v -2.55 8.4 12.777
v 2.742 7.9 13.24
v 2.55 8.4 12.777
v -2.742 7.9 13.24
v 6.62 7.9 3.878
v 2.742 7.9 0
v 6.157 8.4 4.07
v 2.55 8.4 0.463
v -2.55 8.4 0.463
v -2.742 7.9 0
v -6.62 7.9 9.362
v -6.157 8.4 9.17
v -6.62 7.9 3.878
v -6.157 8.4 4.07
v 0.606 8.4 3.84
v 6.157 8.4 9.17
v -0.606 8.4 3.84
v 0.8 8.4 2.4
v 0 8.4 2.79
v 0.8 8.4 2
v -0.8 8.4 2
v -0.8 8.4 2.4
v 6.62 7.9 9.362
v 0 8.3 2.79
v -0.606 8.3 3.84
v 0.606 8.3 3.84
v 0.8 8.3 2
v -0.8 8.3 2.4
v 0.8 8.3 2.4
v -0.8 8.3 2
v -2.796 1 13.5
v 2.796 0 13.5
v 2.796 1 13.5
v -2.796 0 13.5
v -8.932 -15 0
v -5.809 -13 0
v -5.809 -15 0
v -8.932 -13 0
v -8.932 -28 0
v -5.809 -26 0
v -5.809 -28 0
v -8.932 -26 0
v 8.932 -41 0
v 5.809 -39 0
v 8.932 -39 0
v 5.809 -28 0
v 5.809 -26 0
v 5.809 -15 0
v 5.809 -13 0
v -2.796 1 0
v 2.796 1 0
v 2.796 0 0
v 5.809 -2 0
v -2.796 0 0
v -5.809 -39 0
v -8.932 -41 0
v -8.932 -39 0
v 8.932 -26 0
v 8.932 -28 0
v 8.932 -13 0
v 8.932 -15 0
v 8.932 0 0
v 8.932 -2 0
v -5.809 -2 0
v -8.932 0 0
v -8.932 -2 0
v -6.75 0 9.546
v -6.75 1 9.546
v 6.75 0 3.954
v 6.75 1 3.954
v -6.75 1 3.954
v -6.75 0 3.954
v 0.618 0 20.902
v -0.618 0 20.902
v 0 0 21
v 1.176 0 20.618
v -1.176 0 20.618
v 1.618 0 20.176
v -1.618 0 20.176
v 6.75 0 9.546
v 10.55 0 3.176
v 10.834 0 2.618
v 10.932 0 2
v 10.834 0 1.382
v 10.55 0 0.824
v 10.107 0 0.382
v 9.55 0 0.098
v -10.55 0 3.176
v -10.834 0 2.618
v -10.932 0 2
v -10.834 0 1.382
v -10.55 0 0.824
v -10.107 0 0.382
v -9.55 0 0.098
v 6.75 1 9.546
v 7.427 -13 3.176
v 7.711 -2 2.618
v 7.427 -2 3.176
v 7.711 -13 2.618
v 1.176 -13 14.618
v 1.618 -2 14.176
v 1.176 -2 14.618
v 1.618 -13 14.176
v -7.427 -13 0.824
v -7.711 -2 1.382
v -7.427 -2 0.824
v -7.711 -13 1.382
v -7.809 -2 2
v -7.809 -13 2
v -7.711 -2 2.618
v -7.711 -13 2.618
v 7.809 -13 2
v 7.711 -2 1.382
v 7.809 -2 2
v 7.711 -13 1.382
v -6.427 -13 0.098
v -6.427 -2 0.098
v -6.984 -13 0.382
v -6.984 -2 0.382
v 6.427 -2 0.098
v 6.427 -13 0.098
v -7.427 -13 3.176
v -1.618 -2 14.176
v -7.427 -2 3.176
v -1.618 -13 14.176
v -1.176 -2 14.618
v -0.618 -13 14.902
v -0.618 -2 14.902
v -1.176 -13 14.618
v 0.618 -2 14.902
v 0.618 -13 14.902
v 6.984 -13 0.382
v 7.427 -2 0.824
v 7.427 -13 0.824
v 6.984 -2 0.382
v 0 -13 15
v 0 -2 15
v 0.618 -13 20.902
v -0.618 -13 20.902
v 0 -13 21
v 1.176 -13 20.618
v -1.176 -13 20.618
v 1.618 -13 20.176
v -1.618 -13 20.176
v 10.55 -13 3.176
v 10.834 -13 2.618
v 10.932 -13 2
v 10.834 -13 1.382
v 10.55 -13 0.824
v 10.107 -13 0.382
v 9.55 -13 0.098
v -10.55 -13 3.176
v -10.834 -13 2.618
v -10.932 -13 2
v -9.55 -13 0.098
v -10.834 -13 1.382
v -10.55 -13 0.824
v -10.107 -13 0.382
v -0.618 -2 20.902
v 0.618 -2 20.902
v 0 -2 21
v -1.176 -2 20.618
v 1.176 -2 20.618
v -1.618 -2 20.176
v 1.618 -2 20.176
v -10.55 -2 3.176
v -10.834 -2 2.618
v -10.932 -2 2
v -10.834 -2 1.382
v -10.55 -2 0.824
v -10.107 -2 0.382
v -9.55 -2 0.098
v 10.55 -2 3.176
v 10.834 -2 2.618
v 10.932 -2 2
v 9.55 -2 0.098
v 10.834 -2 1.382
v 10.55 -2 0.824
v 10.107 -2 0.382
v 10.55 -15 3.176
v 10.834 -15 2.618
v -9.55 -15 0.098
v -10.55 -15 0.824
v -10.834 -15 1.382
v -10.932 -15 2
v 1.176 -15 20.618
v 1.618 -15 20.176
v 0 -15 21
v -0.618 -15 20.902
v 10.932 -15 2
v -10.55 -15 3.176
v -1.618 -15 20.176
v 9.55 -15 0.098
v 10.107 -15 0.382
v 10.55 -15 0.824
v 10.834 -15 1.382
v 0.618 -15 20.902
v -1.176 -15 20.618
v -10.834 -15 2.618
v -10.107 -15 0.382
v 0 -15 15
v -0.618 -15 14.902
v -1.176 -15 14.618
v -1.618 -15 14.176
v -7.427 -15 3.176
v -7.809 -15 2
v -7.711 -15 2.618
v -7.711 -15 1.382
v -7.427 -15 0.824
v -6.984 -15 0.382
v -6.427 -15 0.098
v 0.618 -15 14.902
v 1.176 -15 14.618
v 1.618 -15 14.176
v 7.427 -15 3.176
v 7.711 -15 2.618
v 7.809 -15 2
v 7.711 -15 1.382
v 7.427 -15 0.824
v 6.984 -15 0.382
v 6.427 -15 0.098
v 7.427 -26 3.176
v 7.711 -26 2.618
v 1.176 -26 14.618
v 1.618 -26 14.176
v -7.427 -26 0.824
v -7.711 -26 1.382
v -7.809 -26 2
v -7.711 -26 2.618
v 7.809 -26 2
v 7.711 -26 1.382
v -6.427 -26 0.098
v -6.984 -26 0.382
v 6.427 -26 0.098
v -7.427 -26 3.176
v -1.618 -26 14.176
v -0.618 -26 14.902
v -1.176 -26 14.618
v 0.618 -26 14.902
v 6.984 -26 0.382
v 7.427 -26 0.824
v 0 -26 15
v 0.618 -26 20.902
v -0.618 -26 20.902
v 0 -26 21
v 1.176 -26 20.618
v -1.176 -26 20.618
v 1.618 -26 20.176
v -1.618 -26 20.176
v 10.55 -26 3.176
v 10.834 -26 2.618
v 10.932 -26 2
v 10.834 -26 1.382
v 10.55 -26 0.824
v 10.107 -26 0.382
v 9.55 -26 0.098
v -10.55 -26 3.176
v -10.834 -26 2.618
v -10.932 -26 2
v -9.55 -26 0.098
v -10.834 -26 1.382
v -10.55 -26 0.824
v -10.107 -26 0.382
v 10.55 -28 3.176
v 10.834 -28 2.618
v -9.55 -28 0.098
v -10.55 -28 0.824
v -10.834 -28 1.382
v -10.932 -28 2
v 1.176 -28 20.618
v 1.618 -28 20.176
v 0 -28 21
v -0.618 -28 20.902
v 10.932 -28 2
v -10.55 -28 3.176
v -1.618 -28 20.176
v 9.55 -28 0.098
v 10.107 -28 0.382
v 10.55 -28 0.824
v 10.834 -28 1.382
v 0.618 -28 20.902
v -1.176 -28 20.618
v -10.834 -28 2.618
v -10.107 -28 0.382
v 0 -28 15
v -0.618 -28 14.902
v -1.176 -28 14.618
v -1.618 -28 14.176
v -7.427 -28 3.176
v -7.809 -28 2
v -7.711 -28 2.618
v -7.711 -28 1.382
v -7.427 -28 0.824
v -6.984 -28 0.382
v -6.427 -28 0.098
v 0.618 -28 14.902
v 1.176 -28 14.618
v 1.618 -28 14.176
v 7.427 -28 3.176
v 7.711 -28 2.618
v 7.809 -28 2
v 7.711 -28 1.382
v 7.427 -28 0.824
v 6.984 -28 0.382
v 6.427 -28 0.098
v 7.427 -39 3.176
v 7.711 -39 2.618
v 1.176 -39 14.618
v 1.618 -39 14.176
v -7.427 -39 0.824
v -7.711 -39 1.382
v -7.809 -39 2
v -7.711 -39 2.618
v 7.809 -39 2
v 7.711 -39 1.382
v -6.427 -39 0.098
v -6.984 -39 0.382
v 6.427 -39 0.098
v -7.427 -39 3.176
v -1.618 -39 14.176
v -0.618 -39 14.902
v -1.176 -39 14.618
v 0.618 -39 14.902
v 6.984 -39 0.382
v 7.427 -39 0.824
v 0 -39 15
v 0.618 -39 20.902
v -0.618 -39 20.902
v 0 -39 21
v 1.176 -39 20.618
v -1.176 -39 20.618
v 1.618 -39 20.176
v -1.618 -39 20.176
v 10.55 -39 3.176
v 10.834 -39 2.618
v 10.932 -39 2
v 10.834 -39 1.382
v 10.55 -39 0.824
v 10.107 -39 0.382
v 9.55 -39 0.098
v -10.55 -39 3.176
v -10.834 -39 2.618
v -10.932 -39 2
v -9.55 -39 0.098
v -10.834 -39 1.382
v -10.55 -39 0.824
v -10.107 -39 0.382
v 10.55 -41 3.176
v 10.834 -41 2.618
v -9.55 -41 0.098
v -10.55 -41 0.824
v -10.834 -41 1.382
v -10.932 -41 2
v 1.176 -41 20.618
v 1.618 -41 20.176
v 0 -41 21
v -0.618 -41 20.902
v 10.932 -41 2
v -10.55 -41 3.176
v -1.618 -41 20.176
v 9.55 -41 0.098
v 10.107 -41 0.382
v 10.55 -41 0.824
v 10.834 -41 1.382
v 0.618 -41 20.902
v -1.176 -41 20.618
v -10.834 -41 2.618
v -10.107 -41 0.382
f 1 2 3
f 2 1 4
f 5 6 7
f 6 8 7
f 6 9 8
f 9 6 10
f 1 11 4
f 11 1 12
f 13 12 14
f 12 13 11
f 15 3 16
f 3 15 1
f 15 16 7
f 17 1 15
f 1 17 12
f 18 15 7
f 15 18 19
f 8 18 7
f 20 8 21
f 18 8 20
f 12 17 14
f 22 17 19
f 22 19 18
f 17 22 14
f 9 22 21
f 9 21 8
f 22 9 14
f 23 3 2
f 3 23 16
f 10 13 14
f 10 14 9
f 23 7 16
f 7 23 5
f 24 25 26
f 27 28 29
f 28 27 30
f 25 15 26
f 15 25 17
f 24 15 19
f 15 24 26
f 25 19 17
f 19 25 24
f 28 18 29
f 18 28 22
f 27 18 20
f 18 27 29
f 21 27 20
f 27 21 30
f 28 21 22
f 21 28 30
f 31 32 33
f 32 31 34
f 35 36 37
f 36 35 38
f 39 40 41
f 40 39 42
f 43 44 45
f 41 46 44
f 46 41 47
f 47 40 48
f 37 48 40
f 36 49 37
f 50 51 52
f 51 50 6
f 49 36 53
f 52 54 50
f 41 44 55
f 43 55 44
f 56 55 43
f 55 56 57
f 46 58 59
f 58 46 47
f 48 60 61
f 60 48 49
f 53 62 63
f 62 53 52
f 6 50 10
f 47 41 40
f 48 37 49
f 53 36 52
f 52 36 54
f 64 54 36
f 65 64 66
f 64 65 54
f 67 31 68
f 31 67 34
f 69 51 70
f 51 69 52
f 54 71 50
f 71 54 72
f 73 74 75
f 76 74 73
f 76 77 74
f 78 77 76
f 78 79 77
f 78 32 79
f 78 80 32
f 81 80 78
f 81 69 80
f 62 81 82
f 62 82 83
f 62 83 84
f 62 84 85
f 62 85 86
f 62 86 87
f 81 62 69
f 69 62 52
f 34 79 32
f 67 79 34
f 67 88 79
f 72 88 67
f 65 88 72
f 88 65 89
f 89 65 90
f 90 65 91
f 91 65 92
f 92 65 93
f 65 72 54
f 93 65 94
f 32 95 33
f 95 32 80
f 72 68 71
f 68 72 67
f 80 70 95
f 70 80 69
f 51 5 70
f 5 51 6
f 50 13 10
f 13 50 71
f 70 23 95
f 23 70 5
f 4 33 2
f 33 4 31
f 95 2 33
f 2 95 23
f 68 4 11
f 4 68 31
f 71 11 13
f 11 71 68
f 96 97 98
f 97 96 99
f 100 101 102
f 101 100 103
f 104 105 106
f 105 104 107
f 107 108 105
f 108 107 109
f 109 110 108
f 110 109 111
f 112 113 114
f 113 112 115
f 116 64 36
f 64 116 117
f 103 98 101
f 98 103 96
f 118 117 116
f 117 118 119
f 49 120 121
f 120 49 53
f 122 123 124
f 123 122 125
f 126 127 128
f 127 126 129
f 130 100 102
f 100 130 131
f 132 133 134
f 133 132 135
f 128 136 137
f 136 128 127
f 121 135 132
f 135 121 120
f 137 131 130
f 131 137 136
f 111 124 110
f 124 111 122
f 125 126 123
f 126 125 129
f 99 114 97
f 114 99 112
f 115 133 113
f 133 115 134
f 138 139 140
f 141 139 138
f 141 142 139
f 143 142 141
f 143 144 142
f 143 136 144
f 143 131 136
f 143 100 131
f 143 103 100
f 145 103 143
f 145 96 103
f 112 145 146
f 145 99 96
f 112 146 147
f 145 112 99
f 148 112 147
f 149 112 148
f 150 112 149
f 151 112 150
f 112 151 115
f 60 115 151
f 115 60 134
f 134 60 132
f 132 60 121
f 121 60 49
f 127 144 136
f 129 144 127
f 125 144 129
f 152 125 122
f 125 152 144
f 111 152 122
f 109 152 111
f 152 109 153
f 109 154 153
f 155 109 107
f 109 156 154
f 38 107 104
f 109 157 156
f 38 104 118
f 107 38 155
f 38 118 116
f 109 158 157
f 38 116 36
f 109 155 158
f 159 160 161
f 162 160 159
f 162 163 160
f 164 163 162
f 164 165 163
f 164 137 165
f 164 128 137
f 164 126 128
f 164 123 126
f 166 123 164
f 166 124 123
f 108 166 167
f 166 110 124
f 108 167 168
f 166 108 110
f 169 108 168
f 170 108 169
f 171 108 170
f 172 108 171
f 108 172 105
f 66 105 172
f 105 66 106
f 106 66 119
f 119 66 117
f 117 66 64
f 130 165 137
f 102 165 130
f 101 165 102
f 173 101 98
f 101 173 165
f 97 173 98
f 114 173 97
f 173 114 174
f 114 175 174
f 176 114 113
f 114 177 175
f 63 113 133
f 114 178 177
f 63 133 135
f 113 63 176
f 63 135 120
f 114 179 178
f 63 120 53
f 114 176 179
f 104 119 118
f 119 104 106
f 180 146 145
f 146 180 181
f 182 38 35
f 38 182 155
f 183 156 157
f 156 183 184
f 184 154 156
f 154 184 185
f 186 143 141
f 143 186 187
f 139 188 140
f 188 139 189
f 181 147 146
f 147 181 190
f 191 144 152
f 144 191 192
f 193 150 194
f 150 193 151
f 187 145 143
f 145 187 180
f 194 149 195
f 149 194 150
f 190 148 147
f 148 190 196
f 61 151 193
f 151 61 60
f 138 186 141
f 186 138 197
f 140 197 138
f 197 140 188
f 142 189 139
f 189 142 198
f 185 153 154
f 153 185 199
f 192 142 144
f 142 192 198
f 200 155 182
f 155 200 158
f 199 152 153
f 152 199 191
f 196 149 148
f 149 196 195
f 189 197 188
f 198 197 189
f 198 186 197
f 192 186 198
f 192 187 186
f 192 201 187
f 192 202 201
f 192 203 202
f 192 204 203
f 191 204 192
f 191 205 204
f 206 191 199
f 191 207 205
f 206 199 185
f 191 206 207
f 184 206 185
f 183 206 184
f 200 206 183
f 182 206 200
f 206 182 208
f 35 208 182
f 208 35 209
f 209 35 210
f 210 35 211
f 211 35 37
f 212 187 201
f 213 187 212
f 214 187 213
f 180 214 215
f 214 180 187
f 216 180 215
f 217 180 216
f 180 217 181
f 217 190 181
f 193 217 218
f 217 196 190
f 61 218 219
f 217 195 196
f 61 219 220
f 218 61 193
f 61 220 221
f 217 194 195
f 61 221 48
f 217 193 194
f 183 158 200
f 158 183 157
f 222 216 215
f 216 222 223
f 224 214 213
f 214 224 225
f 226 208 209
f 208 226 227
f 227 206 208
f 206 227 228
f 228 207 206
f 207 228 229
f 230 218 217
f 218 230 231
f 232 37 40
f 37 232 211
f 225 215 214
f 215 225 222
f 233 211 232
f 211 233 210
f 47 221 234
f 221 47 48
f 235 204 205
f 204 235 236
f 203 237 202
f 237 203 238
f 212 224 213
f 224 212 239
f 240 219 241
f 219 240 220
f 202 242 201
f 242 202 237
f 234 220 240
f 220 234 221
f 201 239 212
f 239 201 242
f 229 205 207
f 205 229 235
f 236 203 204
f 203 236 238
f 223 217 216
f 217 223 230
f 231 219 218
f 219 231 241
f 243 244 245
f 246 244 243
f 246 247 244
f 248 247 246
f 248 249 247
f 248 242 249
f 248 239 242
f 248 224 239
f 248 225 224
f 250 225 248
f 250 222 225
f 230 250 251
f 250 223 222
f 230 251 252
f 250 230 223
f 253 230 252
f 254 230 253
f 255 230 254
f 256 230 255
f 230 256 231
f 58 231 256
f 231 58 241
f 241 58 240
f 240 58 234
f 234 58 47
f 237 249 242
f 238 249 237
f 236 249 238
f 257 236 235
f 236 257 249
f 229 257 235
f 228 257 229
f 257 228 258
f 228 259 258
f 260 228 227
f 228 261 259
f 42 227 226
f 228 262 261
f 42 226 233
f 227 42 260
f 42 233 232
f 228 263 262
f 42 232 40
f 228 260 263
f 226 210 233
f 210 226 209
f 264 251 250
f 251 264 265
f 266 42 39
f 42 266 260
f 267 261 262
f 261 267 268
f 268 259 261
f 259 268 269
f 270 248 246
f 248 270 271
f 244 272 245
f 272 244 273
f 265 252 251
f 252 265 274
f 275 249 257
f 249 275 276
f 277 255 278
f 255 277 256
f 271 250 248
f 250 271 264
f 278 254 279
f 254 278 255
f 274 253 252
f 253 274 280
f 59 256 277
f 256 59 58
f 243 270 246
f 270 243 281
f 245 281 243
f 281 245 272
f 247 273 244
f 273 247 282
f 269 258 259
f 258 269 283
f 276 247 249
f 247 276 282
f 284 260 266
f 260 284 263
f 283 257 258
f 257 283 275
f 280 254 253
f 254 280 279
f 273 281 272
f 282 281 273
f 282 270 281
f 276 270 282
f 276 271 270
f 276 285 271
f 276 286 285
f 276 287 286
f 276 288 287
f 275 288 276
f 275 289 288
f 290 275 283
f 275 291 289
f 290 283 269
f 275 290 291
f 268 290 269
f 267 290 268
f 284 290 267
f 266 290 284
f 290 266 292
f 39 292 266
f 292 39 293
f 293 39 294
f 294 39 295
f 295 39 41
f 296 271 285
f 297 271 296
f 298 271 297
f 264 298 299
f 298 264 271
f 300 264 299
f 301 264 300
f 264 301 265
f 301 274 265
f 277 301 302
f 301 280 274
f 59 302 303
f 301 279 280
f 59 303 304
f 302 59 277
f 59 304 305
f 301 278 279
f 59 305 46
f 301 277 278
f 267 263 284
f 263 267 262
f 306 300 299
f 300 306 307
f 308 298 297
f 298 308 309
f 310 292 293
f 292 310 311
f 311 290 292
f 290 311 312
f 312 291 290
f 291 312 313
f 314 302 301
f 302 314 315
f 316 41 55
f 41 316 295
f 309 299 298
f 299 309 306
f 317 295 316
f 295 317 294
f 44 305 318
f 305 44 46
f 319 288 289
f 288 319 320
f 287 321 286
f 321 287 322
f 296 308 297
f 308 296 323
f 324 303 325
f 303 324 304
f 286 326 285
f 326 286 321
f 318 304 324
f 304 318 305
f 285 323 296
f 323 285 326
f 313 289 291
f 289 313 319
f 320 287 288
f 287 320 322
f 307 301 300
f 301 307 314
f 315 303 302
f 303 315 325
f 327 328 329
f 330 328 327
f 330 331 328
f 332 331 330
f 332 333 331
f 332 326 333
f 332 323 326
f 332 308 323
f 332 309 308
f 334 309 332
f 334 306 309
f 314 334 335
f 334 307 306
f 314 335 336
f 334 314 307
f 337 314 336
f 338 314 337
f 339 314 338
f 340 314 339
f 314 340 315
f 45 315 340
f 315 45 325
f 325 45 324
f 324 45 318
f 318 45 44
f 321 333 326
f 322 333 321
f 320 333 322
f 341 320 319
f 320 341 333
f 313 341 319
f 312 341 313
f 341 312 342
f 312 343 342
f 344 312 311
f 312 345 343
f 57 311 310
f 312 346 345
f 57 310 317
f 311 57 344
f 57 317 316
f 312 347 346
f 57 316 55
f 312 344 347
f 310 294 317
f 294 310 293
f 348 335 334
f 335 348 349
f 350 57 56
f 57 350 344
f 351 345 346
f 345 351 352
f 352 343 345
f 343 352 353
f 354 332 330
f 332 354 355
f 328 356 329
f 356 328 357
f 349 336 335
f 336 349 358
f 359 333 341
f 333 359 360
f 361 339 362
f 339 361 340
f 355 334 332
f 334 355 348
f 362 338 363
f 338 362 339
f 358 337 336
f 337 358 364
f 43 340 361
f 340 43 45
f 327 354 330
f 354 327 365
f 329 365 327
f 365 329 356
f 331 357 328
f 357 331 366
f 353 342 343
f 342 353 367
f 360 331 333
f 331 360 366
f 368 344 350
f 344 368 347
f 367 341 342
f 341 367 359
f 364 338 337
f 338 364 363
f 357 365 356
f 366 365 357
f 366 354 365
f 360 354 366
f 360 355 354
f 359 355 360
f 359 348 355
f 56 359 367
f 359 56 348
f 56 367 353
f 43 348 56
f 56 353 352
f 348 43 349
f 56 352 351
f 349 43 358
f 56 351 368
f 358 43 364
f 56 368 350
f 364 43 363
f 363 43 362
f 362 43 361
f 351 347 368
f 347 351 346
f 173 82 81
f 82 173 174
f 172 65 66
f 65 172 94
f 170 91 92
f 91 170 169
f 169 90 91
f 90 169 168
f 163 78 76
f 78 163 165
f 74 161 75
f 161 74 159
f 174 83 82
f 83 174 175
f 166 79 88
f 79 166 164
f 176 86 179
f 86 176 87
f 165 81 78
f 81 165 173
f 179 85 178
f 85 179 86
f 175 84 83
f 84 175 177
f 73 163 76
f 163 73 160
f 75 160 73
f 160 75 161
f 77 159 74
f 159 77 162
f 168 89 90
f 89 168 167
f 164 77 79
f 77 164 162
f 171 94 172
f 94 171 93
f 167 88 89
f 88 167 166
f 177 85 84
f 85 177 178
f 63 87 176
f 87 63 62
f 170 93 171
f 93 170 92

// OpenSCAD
/* Simple pliers holder for Multiboard 

---
This object is part of Multiboard, a FREE "all in one" organization system with 3000+ parts, that combines pegboard holes, honeycomb snaps, Gridfinity like bins, threads, brakes, and much more.

Explore and build the coolest, most adaptable workshop at https://multiboard.io

*/


/* [Dimensions] */
sattleWdth=11;
sattleHght=15;
sattleBrim=6;
sattleWallWdth=2;
sattleCount=3;
cornerRad=2;
sattleAng=55;
$fn=20;

rotate(180) MBpushFit();
rotate([90,0,0]) linear_extrude(sattleWallWdth) tri(h=sattleHght+sattleBrim,a=sattleAng,r=cornerRad);

for (i=[0:sattleCount-1]){
  translate([0,-sattleWallWdth*(i+1)-sattleWdth*i,0]) rotate([90,0,0]) linear_extrude(sattleWdth) tri(h=sattleHght,a=sattleAng,r=cornerRad);
  translate([0,-(sattleWallWdth+sattleWdth)*(i+1)]) rotate([90,0,0]) linear_extrude(sattleWallWdth) tri(h=sattleHght+sattleBrim,a=sattleAng,r=cornerRad);
}





*tri();
module tri(h=10,a=45,r=2){
  baseWdth=tan(a/2)*h*2;
  hull(){
    translate([0,h-r]) circle(r);
    translate([-baseWdth/2+r,r]) circle(r);
    translate([baseWdth/2-r,r]) circle(r);
  }
}


module MBpushFit(isPositive=true, isHorizontal=true, extend=0, center=false){
  pFbotIRad=6.75;
  pFbotORad=ri2ro(pFbotIRad,8);
  pFbotHght=1;
  pFtopHght=0.5;
  pFtopIRad=6.62;
  pFtopORad=ri2ro(pFtopIRad,8);
  pFovHght=8.4;
  // -- horizontal --
  sFac=pFtopIRad/pFbotIRad;
  
  cntrOffset= center ? [0,0,0] : [0,0,pFbotIRad];
  cntrRot = center ? [0,0,0] : [90,0,0];
  
  translate(cntrOffset) rotate(cntrRot){
      //bot
    translate([0,0,-extend]) linear_extrude(pFbotHght+extend) rotate(180/8) circle(r=pFbotORad,$fn=8);
    //mid
    translate([0,-pFbotIRad,pFbotHght]) 
      linear_extrude(pFovHght-pFtopHght-pFbotHght,scale=[sFac,sFac]) 
        translate([0,pFbotIRad,0]) 
          rotate(180/8) circle(r=pFbotORad,$fn=8);
    //top
    difference(){        
      translate([0,pFtopIRad-pFbotIRad,pFovHght-pFtopHght])
        linear_extrude(pFtopHght,scale=0.93) rotate(180/8) circle(r=pFtopORad,$fn=8);
      translate([0,-4.55,pFovHght-0.1]) linear_extrude(0.2) printDirIcon();
      }
    }
}

module printDirIcon(){
  square([1.6,0.4],true);
  translate([0,1.29]) rotate(30) circle(d=1.4,$fn=3);
}

// -- helper Functions -- 
function ri2ro(ri,N)=ri/cos(180/N);
function ri2a(ri,N)=2*ri*tan(180/N);
